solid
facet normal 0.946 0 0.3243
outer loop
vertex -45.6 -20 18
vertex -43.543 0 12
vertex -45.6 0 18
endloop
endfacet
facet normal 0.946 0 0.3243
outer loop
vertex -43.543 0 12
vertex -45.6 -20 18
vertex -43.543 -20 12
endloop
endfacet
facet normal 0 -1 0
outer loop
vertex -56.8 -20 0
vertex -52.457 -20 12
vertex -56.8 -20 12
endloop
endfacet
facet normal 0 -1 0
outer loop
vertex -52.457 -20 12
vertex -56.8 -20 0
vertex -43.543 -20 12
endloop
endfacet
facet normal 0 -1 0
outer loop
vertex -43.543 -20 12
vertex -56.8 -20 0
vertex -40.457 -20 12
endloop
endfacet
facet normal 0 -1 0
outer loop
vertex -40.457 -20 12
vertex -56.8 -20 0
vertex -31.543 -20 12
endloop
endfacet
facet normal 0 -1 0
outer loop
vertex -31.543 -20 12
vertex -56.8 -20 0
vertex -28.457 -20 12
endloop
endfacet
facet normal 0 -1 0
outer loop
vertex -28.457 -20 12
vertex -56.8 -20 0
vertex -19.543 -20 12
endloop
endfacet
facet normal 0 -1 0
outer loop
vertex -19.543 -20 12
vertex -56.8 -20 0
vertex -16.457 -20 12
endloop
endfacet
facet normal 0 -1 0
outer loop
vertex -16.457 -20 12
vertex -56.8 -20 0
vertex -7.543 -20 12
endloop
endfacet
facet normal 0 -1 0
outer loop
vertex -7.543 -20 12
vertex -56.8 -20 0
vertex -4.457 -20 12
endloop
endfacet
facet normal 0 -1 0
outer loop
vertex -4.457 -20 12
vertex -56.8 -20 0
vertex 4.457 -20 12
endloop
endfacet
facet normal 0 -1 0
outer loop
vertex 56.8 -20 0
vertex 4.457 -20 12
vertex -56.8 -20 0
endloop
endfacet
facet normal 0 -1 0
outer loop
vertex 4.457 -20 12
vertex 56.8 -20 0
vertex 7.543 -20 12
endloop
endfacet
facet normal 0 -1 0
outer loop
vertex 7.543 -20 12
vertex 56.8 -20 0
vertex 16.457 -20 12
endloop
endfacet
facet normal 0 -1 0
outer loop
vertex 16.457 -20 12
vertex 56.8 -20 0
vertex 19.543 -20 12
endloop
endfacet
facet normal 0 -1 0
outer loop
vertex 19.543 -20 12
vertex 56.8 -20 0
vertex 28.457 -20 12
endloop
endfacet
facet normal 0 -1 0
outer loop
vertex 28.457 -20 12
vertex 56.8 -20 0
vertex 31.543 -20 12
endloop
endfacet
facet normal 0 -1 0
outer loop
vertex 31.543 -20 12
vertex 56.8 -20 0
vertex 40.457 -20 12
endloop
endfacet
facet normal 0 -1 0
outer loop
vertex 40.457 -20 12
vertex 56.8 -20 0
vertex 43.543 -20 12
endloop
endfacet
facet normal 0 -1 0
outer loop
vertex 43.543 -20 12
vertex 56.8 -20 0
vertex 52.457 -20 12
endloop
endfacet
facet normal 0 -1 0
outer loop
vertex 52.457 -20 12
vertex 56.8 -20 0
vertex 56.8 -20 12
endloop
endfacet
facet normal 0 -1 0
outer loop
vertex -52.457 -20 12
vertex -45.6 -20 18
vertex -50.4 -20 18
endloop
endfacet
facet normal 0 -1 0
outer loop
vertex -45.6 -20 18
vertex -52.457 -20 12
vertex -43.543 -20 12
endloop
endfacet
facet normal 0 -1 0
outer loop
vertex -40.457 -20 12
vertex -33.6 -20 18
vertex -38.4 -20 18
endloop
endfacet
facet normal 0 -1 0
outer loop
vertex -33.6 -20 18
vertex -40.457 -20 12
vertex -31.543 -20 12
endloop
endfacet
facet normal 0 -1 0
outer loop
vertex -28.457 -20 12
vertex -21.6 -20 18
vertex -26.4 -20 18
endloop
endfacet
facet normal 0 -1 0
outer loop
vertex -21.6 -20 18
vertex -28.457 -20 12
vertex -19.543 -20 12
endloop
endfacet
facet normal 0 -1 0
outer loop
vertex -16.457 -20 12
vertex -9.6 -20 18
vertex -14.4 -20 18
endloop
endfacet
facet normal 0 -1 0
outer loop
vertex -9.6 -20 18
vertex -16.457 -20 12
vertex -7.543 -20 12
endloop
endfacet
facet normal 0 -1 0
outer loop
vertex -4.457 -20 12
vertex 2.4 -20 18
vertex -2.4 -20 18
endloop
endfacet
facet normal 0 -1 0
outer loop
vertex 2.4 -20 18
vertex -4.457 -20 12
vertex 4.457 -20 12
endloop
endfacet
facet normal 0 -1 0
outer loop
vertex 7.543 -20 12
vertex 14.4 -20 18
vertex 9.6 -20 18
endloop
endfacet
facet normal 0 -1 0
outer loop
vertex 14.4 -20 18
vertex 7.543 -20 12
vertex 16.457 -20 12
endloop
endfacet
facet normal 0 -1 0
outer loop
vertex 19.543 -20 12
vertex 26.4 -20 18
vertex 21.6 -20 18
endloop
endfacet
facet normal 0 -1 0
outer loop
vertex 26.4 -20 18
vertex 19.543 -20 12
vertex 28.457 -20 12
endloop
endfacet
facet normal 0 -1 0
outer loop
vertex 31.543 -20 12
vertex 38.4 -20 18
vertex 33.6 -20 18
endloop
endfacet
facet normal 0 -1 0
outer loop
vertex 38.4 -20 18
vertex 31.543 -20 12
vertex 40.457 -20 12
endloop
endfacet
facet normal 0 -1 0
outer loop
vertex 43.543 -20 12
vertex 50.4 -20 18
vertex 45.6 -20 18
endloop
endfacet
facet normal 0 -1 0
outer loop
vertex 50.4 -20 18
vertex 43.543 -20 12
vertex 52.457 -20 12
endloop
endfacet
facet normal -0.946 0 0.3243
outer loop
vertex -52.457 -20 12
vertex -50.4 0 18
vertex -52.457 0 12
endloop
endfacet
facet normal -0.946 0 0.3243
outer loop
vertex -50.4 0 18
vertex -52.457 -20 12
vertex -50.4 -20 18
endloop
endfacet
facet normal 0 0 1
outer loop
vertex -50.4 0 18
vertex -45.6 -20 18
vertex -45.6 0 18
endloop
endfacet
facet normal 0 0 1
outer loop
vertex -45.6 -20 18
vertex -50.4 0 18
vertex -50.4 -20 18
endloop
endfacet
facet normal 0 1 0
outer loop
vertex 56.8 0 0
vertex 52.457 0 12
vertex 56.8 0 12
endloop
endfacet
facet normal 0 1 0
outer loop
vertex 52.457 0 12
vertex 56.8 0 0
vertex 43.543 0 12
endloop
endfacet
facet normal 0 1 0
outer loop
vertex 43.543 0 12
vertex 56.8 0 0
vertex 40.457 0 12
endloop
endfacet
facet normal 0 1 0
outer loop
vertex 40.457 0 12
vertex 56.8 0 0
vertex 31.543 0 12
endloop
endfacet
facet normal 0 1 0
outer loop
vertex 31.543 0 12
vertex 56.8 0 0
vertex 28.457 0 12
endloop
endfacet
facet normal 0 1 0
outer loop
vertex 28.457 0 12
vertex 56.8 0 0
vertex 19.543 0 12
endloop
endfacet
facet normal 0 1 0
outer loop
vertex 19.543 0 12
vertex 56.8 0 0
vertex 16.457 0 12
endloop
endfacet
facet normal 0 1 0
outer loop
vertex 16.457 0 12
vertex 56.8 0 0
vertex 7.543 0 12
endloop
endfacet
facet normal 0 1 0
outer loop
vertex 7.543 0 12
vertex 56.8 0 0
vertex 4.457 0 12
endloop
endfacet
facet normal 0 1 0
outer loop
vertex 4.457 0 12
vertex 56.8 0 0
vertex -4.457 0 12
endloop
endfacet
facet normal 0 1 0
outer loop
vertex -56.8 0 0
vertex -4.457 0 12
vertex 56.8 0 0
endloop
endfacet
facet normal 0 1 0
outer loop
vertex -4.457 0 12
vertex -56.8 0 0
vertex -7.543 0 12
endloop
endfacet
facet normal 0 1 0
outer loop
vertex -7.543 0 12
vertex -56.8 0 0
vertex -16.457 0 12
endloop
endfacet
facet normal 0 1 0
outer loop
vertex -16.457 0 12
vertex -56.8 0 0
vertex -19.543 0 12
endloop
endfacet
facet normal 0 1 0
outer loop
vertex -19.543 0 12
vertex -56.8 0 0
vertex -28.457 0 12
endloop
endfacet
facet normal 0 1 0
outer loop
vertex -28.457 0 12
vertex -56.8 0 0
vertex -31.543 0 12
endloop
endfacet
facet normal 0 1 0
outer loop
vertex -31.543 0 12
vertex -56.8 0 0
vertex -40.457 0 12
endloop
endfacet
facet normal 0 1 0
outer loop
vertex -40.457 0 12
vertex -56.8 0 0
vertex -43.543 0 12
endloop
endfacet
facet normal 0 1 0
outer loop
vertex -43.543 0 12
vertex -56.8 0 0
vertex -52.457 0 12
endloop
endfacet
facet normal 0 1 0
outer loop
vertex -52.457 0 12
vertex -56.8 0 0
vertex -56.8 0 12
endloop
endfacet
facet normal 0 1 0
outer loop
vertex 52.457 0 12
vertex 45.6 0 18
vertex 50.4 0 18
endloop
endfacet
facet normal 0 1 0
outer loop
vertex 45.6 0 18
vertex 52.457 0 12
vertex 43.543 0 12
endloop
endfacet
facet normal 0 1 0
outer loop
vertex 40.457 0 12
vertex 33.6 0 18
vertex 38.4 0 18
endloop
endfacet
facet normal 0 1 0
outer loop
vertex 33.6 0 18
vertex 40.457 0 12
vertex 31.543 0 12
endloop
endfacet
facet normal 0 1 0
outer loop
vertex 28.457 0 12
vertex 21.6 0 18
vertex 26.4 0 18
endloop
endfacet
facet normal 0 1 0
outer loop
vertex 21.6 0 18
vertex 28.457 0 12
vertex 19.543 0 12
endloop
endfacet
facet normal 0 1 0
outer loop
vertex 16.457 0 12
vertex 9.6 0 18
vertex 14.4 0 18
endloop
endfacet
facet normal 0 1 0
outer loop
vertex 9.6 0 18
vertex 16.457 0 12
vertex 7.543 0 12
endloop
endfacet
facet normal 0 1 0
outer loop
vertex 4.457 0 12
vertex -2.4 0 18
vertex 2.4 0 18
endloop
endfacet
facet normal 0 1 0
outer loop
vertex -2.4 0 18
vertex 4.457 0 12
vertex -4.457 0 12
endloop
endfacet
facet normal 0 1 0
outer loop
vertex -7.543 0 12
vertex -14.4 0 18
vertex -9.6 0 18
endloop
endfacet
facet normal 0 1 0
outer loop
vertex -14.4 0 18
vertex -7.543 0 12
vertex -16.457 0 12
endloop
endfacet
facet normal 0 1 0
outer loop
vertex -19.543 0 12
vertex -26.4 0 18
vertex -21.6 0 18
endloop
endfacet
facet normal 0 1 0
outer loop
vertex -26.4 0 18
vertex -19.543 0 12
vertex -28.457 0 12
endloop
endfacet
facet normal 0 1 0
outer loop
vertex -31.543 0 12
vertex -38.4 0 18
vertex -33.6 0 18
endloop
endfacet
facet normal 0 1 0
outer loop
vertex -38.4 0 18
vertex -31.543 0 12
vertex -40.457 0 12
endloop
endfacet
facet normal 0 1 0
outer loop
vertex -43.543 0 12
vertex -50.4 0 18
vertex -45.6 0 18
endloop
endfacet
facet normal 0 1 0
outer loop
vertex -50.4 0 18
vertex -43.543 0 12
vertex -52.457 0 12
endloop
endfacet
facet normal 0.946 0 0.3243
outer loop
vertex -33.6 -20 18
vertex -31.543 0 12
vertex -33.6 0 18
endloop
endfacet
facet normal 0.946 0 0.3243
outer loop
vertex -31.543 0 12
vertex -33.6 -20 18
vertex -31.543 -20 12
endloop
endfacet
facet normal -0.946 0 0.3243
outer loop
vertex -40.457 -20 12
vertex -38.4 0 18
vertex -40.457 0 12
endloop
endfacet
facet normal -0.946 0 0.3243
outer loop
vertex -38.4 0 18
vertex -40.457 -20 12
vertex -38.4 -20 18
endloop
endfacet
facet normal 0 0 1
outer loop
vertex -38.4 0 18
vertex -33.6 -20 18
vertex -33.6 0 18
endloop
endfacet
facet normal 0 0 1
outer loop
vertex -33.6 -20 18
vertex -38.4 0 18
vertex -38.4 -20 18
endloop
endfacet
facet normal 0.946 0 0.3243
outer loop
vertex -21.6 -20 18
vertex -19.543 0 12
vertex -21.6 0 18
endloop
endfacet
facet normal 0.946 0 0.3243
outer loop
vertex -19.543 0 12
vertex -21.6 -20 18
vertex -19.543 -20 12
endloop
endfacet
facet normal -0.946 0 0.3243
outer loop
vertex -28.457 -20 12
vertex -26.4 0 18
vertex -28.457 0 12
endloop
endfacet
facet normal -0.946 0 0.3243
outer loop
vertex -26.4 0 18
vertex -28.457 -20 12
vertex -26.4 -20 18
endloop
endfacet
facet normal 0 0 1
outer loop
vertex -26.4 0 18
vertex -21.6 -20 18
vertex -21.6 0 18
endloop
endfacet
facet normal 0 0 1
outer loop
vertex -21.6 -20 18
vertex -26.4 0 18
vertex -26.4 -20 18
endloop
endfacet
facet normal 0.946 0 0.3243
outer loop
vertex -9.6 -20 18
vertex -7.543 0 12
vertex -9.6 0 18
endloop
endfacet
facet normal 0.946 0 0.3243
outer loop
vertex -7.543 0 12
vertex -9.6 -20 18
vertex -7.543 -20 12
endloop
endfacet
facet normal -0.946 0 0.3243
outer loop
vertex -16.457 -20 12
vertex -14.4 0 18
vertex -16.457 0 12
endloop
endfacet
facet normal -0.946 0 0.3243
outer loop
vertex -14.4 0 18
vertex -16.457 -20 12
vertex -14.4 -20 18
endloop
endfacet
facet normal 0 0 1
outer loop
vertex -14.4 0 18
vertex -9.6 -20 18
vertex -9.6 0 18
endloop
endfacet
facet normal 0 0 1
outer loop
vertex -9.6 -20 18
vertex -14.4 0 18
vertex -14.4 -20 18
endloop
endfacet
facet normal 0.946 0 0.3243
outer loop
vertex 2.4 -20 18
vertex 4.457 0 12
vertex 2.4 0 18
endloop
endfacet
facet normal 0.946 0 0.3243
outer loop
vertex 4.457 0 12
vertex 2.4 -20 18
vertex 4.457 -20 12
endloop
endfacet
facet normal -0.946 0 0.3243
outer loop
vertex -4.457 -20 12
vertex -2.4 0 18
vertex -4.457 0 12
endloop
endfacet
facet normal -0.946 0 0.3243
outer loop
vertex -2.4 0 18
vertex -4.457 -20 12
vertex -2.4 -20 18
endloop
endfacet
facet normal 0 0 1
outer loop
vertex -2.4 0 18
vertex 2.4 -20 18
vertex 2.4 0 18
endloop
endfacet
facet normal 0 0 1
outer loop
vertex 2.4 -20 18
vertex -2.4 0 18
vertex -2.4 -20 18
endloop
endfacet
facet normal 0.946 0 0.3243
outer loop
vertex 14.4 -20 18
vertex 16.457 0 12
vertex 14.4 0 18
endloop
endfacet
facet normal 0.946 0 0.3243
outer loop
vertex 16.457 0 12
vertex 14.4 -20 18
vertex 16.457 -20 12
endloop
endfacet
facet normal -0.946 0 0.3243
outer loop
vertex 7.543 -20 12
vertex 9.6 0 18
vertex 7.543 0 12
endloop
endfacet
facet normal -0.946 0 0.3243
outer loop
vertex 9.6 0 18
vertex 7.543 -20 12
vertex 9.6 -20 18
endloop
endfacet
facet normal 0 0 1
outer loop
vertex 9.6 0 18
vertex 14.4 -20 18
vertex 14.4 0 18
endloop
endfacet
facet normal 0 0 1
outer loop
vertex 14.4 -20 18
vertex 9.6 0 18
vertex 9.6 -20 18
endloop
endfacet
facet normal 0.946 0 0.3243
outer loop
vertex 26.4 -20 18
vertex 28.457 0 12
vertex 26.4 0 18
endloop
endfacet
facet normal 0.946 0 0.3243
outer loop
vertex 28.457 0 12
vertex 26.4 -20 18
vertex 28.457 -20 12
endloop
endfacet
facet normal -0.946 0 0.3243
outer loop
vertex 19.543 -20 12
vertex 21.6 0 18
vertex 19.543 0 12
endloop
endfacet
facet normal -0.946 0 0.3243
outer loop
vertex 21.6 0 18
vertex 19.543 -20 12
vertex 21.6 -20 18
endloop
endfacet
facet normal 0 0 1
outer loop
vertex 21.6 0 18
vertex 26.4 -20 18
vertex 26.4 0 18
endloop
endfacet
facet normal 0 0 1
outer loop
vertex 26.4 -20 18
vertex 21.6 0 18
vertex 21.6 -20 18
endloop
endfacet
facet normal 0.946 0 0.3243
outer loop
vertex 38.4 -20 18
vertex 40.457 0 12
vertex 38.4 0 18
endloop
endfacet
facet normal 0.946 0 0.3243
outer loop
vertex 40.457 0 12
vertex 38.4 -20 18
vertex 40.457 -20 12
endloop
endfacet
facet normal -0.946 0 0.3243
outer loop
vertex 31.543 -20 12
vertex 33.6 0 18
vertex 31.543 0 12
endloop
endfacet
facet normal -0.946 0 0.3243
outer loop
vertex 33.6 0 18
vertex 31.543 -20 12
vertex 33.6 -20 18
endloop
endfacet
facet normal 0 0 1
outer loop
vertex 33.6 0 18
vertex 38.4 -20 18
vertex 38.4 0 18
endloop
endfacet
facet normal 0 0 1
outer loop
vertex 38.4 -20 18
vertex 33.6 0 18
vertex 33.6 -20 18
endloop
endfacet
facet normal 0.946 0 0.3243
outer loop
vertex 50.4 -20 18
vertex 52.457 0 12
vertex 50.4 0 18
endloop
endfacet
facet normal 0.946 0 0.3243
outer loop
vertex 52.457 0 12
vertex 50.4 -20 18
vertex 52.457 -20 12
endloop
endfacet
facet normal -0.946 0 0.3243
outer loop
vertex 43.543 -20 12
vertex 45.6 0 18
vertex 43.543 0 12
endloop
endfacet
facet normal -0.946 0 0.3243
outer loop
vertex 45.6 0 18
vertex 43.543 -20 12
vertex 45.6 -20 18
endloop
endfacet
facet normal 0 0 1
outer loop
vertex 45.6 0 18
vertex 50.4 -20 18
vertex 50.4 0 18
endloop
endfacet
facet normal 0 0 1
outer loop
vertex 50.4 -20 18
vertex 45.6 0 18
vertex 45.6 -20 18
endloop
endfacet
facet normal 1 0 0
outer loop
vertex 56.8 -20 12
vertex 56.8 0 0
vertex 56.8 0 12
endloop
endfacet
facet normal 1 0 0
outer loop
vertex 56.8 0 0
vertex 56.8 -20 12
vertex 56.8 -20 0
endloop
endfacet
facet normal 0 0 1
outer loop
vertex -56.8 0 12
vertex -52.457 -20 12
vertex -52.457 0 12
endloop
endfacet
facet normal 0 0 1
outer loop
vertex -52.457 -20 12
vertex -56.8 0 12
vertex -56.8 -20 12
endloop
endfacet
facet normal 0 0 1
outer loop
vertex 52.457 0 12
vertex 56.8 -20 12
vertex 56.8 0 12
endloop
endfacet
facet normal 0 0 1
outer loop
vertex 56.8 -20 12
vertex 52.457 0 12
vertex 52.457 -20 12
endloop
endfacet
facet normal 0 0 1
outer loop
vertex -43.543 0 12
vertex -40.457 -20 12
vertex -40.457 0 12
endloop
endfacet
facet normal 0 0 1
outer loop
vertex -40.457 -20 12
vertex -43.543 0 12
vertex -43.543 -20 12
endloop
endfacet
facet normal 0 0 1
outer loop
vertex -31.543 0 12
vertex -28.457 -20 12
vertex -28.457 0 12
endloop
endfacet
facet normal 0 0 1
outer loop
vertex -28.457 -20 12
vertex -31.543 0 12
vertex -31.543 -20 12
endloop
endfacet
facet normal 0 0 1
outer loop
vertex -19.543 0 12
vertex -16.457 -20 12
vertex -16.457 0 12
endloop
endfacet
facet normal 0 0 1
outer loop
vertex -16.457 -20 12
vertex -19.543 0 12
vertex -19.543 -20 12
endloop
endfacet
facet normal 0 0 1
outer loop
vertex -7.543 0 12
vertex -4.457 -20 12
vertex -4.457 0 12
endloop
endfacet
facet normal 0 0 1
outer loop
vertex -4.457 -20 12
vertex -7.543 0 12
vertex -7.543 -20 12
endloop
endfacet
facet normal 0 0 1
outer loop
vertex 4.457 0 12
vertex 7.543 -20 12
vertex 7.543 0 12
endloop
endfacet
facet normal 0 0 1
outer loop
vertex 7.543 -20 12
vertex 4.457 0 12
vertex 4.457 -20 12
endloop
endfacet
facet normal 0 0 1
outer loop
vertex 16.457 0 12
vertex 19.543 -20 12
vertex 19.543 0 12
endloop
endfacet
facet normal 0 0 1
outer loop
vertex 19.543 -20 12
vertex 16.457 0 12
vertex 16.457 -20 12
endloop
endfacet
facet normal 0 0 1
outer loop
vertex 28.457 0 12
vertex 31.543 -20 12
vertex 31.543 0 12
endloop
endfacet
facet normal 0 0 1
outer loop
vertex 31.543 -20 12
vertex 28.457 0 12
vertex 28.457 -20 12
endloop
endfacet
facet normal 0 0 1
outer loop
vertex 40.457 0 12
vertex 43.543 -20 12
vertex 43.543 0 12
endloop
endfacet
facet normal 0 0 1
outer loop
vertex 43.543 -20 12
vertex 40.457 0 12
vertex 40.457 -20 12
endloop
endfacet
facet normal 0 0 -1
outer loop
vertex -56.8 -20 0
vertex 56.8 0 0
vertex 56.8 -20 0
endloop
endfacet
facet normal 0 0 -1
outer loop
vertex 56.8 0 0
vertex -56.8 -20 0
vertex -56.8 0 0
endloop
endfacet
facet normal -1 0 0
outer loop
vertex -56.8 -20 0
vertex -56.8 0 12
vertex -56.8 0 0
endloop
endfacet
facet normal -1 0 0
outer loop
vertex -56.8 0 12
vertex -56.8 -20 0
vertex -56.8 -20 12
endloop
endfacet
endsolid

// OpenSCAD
$fn = 32;

// ----------------------------------------------------------------------
// Toothed rack, 9 teeth
// 12 mm pitch, 6 mm teeth
// ----------------------------------------------------------------------

// --- parameters (mm) ---
bar_w = 20;     // bar width (Y)
bar_h = 12;     // bar height (Z)
teeth = 9;      // number of teeth
pitch = 12;     // tooth pitch
tooth_h = 6;    // tooth height above the bar
root_w = 9.6;   // tooth width at the root
crest_w = 4.8;  // tooth width at the crest

// --- derived feature positions (mm) ---
span = (teeth - 1) * pitch;  // = 96   distance between the outer teeth
bar_l = span + root_w + 8;   // = 113.6   bar length: teeth plus 4 mm at each end
tooth_x = -span / 2;         // = -48   X of the first tooth
height = bar_h + tooth_h;    // = 18   overall height
feature_centers = [
  [tooth_x + 0 * pitch, -bar_w / 2],
  [tooth_x + 1 * pitch, -bar_w / 2],
  [tooth_x + 2 * pitch, -bar_w / 2],
  [tooth_x + 3 * pitch, -bar_w / 2],
  [tooth_x + 4 * pitch, -bar_w / 2],
  [tooth_x + 5 * pitch, -bar_w / 2],
  [tooth_x + 6 * pitch, -bar_w / 2],
  [tooth_x + 7 * pitch, -bar_w / 2],
  [tooth_x + 8 * pitch, -bar_w / 2]
];   // tooth centre line, drives the tooth loop

// bar with a rack of teeth, one extruded trapezoium per centre
module rack_tooth() {
  linear_extrude(height = bar_w)
    polygon(points = [
      [0, 0],
      [root_w, 0],
      [root_w / 2 + crest_w / 2, tooth_h + 1],
      [root_w / 2 - crest_w / 2, tooth_h + 1]
    ]);
}

union() {
  translate([-bar_l / 2, -bar_w, 0]) cube([bar_l, bar_w, bar_h]);
  for (centre = feature_centers)
    translate([centre[0] - root_w / 2, 0, bar_h - 1]) rotate([90, 0, 0]) rack_tooth();
}
